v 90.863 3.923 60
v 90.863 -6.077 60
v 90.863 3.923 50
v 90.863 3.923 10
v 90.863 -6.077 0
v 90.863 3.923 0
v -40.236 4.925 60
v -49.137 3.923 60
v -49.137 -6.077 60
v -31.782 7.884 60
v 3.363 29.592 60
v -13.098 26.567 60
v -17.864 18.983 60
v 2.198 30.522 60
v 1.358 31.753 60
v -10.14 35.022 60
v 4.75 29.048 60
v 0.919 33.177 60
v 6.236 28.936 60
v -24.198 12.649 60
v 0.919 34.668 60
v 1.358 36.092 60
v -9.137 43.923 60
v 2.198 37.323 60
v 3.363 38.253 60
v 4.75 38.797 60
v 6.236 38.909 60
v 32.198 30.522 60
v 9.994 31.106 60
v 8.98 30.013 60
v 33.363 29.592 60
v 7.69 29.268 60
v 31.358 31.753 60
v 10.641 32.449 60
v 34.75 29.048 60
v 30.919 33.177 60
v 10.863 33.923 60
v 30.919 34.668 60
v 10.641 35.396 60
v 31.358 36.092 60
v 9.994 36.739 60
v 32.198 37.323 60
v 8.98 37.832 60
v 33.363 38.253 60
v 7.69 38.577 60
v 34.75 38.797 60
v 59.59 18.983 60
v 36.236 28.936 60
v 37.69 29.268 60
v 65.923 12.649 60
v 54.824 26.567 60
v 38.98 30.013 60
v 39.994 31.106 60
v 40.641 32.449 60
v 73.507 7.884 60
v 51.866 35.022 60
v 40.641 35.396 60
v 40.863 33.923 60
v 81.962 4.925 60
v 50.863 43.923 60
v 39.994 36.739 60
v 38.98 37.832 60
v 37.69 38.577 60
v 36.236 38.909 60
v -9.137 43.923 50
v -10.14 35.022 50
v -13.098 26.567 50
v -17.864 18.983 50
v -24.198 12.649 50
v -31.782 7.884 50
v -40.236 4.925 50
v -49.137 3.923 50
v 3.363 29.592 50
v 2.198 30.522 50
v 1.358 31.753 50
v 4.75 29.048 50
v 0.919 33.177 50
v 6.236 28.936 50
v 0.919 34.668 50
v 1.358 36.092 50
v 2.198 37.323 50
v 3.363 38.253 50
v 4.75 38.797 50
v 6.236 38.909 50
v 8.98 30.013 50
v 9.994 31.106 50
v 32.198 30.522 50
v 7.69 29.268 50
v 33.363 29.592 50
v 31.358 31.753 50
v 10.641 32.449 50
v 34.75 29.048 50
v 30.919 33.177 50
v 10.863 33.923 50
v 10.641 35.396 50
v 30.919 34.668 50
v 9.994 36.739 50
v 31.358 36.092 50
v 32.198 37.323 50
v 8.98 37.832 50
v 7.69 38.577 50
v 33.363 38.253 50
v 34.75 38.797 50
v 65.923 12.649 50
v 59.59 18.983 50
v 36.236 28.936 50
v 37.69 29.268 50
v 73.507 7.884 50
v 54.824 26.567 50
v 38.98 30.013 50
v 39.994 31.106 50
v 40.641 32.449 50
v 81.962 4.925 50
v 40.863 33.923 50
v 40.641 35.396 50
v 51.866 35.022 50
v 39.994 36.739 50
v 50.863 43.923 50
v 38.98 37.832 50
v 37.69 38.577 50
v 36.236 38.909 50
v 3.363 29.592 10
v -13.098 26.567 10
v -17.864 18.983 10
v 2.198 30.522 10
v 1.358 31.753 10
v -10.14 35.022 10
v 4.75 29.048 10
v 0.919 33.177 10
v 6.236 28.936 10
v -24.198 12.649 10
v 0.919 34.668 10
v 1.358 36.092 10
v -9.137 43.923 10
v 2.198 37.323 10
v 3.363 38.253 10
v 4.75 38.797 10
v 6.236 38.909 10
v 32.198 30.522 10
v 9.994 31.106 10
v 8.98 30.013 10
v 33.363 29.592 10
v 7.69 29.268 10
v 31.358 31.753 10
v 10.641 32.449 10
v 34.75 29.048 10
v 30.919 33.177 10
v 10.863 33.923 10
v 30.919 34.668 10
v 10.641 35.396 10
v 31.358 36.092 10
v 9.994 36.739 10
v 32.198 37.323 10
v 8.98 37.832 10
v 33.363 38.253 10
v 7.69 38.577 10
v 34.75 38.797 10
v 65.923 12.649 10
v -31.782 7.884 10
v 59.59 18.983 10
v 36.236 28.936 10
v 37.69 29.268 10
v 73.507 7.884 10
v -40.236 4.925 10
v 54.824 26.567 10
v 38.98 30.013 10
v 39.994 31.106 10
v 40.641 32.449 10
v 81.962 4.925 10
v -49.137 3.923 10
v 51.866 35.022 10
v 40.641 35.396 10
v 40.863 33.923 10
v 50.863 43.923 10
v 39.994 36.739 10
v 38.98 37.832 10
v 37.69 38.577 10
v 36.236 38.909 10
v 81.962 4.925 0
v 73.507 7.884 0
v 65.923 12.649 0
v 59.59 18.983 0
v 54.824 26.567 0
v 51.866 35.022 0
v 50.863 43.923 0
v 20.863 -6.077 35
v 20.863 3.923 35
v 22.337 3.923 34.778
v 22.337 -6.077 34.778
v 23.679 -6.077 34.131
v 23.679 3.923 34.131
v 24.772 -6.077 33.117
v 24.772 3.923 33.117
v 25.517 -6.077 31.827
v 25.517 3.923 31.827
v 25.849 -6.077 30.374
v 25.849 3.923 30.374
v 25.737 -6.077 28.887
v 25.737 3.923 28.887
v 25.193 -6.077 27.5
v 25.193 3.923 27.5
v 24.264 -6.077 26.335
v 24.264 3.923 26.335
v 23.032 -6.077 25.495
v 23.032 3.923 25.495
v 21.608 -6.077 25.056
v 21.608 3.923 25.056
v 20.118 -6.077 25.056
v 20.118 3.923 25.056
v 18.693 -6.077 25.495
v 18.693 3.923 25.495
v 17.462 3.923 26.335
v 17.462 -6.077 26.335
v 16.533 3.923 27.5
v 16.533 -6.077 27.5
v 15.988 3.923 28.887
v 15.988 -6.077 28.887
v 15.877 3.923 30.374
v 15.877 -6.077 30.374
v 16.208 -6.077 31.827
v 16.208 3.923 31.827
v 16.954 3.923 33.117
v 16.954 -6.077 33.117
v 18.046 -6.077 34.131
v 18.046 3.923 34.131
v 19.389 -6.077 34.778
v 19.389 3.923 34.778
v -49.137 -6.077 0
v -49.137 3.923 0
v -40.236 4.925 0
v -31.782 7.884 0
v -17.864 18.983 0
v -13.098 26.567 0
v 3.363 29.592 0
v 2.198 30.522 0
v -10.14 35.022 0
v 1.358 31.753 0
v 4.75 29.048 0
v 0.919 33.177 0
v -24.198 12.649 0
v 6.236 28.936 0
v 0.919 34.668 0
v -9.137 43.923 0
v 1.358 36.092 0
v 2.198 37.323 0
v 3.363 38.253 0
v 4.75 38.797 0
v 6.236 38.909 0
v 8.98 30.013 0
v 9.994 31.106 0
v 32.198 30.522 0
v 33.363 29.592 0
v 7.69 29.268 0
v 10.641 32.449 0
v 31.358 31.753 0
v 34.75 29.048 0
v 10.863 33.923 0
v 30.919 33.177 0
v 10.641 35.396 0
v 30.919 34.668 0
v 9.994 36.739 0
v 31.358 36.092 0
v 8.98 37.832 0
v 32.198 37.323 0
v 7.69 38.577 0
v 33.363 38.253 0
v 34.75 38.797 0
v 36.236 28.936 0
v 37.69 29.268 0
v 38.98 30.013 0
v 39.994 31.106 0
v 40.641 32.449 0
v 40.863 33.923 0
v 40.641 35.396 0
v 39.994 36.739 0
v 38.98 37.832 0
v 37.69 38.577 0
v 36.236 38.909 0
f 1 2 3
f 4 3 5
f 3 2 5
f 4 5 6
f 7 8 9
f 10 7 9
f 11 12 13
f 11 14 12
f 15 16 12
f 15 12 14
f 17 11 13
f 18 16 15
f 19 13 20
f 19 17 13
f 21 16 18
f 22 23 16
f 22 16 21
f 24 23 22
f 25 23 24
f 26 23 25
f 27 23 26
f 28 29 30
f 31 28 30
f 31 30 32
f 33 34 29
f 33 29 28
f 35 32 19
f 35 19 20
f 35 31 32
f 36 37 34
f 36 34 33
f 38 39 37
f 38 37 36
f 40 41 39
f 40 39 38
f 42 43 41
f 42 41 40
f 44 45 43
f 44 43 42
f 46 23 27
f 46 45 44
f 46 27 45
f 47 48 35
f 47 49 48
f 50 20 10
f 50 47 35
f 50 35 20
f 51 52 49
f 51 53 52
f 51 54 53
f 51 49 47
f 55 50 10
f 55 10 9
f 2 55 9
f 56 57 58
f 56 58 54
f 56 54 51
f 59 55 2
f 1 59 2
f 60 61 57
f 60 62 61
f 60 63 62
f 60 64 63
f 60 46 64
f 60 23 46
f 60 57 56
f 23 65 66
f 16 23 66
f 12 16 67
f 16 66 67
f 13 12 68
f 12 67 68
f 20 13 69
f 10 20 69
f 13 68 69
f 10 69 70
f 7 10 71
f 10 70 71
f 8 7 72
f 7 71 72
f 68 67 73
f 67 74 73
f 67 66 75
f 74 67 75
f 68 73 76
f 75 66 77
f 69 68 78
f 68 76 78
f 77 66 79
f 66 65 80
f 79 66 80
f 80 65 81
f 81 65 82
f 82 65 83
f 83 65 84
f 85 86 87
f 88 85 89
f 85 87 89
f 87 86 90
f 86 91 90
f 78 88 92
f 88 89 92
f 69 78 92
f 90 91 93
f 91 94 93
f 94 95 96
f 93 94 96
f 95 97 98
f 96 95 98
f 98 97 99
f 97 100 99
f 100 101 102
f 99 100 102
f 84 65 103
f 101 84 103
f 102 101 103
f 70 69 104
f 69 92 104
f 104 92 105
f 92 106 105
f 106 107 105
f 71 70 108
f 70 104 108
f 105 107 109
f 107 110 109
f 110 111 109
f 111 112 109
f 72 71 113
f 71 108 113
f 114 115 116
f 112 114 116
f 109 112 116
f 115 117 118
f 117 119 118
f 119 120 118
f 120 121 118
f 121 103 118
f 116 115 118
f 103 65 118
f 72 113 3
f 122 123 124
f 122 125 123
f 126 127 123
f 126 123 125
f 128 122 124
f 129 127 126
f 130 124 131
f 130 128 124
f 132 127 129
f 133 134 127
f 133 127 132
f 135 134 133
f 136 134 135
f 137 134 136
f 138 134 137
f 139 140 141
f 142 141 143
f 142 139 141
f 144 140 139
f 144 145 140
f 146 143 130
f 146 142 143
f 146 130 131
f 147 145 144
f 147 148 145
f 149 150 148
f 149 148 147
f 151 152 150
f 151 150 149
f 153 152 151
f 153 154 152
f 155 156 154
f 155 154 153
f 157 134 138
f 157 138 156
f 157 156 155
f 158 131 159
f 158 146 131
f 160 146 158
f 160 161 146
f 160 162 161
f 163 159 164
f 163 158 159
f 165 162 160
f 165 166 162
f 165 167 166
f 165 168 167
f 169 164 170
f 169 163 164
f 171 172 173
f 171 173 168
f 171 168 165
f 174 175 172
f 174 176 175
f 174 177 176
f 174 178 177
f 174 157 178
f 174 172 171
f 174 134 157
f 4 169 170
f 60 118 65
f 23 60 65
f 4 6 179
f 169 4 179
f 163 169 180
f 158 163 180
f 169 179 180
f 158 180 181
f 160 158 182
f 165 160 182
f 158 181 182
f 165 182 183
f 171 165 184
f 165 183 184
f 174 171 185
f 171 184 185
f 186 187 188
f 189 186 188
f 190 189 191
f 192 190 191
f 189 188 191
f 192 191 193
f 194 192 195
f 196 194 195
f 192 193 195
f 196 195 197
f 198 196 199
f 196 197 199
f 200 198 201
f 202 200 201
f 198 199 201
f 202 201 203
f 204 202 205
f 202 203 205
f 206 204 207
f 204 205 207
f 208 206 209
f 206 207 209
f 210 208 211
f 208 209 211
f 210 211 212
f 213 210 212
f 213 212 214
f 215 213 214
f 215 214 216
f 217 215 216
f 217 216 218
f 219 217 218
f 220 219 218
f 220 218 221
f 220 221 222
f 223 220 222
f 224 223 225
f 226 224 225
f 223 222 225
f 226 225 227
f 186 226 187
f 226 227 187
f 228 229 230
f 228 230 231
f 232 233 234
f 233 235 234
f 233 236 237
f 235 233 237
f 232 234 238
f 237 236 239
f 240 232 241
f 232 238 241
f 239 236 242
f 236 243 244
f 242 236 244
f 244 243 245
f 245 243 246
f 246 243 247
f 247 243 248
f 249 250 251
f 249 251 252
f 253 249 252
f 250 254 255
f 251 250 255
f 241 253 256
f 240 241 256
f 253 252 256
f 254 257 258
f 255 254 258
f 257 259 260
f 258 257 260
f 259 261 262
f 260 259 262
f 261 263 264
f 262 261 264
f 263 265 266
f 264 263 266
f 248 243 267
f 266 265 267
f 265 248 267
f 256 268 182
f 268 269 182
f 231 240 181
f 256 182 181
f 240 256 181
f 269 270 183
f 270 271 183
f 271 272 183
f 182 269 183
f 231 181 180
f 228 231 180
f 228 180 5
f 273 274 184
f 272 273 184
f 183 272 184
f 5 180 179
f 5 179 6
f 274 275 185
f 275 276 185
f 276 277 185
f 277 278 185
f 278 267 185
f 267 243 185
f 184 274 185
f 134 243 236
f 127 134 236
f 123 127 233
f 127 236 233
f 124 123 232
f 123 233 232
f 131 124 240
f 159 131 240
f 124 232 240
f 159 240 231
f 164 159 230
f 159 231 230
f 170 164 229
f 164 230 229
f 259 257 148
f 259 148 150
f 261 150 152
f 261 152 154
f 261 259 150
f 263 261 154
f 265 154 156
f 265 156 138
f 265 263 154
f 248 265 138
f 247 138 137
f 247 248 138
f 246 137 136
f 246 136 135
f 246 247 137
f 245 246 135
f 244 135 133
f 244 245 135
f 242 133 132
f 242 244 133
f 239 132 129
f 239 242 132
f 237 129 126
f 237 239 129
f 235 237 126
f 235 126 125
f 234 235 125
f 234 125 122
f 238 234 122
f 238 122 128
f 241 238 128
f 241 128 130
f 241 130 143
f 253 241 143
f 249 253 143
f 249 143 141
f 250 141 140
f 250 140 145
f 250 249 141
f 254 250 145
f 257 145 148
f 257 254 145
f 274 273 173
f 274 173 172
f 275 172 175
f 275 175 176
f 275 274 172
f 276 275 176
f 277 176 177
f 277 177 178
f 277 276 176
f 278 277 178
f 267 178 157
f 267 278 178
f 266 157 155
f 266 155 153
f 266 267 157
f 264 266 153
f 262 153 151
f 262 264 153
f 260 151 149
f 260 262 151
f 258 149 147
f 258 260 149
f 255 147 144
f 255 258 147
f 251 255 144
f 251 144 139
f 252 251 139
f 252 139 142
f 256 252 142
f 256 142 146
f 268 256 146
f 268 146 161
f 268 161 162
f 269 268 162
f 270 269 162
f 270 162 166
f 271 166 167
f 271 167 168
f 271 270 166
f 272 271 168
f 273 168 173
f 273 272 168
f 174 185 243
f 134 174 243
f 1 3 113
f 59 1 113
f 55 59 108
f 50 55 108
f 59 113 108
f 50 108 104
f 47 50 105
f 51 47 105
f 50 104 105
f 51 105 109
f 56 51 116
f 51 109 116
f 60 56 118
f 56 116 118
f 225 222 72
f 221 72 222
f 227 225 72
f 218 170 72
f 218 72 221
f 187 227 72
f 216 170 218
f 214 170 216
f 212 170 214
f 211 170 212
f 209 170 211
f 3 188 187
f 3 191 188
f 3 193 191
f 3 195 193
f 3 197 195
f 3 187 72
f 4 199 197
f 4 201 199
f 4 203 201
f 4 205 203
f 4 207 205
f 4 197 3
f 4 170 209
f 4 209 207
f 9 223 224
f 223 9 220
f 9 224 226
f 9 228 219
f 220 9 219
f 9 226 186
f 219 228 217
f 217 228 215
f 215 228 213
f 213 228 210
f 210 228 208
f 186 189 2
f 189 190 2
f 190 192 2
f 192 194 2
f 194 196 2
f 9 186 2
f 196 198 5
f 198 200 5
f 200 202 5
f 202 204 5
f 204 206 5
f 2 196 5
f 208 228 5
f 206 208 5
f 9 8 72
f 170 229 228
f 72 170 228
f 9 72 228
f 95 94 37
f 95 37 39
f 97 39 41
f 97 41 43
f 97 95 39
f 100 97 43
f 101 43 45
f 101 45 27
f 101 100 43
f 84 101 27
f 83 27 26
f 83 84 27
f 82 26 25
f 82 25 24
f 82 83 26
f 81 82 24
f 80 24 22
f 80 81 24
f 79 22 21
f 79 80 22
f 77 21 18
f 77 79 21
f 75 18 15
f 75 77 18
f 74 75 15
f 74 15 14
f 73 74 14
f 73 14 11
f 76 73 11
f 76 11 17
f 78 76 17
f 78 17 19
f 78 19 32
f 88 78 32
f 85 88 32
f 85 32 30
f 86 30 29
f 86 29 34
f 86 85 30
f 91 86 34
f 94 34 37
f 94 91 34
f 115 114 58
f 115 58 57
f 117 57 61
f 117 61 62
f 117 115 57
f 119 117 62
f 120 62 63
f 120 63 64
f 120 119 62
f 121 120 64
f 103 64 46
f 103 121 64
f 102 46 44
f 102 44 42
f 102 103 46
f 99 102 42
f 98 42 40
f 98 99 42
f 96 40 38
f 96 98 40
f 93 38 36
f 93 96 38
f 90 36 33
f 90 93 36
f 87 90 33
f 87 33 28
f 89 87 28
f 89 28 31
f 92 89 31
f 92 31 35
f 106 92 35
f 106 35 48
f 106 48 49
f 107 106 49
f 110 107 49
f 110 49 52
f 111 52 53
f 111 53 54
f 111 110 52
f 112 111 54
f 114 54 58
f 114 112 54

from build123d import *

# Parameters (mm, degrees)
IZIM2_R                     = 5
Y_KSEKLIK_EKSTR_ZYON2_DEPTH = 10
IZIM3_W                     = 140
IZIM3_H                     = 10
Y_KSEKLIK_EKSTR_ZYON3_DEPTH = 40
IZIM4_R                     = 5
Y_KSEKLIK_EKSTR_ZYON4_DEPTH = 10
IZIM5_R                     = 5
KES_EKSTR_ZYON1_DEPTH       = 10


with BuildPart() as part:
    # Çizim2 → Yükseklik-Ekstrüzyon2 (new body)
    with BuildSketch(Plane.XY):
        with BuildLine():
            Line((-49.137152365, 3.922510102), (-49.137152365, -6.077489898))
            Line((-49.137152365, -6.077489898), (90.862847635, -6.077489898))
            Line((90.862847635, -6.077489898), (90.862847635, 3.922510102))
            ThreePointArc((90.862847635, 3.922510102), (62.578576387, 15.638238855), (50.862847635, 43.922510102))
            Line((50.862847635, 43.922510102), (-9.137152365, 43.922510102))
            ThreePointArc((-9.137152365, 43.922510102), (-20.852881118, 15.638238855), (-49.137152365, 3.922510102))
        make_face()
        with Locations((5.862847635, 33.922510102)):
            Circle(IZIM2_R, mode=Mode.SUBTRACT)
        with Locations((35.862847635, 33.922510102)):
            Circle(IZIM2_R, mode=Mode.SUBTRACT)
    extrude(amount=Y_KSEKLIK_EKSTR_ZYON2_DEPTH)

    # Çizim3 → Yükseklik-Ekstrüzyon3 (add)
    with BuildSketch(Plane.XY.offset(10)):
        with Locations((20.862847635, -1.077489898)):
            Rectangle(IZIM3_W, IZIM3_H)
    extrude(amount=Y_KSEKLIK_EKSTR_ZYON3_DEPTH)

    # Çizim4 → Yükseklik-Ekstrüzyon4 (add)
    with BuildSketch(Plane.XY.offset(50)):
        with BuildLine():
            Line((-49.137152365, 3.922510102), (-49.137152365, -6.077489898))
            Line((-49.137152365, -6.077489898), (90.862847635, -6.077489898))
            Line((90.862847635, -6.077489898), (90.862847635, 3.922510102))
            ThreePointArc((90.862847635, 3.922510102), (62.578576387, 15.638238855), (50.862847635, 43.922510102))
            Line((50.862847635, 43.922510102), (-9.137152365, 43.922510102))
            ThreePointArc((-9.137152365, 43.922510102), (-20.852881118, 15.638238855), (-49.137152365, 3.922510102))
        make_face()
        with Locations((5.862847635, 33.922510102)):
            Circle(IZIM4_R, mode=Mode.SUBTRACT)
        with Locations((35.862847635, 33.922510102)):
            Circle(IZIM4_R, mode=Mode.SUBTRACT)
    extrude(amount=Y_KSEKLIK_EKSTR_ZYON4_DEPTH)

    # Çizim5 → Kes-Ekstrüzyon1 (cut)
    with BuildSketch(Plane(origin=(0, 3.922510102, 0), x_dir=(1, 0, 0), z_dir=(0, 1, 0))):
        with Locations(Location((20.862847635, -30, 0), (0, 0, 270))):
            Circle(IZIM5_R)
    extrude(amount=-KES_EKSTR_ZYON1_DEPTH, mode=Mode.SUBTRACT)


solid = part.part
